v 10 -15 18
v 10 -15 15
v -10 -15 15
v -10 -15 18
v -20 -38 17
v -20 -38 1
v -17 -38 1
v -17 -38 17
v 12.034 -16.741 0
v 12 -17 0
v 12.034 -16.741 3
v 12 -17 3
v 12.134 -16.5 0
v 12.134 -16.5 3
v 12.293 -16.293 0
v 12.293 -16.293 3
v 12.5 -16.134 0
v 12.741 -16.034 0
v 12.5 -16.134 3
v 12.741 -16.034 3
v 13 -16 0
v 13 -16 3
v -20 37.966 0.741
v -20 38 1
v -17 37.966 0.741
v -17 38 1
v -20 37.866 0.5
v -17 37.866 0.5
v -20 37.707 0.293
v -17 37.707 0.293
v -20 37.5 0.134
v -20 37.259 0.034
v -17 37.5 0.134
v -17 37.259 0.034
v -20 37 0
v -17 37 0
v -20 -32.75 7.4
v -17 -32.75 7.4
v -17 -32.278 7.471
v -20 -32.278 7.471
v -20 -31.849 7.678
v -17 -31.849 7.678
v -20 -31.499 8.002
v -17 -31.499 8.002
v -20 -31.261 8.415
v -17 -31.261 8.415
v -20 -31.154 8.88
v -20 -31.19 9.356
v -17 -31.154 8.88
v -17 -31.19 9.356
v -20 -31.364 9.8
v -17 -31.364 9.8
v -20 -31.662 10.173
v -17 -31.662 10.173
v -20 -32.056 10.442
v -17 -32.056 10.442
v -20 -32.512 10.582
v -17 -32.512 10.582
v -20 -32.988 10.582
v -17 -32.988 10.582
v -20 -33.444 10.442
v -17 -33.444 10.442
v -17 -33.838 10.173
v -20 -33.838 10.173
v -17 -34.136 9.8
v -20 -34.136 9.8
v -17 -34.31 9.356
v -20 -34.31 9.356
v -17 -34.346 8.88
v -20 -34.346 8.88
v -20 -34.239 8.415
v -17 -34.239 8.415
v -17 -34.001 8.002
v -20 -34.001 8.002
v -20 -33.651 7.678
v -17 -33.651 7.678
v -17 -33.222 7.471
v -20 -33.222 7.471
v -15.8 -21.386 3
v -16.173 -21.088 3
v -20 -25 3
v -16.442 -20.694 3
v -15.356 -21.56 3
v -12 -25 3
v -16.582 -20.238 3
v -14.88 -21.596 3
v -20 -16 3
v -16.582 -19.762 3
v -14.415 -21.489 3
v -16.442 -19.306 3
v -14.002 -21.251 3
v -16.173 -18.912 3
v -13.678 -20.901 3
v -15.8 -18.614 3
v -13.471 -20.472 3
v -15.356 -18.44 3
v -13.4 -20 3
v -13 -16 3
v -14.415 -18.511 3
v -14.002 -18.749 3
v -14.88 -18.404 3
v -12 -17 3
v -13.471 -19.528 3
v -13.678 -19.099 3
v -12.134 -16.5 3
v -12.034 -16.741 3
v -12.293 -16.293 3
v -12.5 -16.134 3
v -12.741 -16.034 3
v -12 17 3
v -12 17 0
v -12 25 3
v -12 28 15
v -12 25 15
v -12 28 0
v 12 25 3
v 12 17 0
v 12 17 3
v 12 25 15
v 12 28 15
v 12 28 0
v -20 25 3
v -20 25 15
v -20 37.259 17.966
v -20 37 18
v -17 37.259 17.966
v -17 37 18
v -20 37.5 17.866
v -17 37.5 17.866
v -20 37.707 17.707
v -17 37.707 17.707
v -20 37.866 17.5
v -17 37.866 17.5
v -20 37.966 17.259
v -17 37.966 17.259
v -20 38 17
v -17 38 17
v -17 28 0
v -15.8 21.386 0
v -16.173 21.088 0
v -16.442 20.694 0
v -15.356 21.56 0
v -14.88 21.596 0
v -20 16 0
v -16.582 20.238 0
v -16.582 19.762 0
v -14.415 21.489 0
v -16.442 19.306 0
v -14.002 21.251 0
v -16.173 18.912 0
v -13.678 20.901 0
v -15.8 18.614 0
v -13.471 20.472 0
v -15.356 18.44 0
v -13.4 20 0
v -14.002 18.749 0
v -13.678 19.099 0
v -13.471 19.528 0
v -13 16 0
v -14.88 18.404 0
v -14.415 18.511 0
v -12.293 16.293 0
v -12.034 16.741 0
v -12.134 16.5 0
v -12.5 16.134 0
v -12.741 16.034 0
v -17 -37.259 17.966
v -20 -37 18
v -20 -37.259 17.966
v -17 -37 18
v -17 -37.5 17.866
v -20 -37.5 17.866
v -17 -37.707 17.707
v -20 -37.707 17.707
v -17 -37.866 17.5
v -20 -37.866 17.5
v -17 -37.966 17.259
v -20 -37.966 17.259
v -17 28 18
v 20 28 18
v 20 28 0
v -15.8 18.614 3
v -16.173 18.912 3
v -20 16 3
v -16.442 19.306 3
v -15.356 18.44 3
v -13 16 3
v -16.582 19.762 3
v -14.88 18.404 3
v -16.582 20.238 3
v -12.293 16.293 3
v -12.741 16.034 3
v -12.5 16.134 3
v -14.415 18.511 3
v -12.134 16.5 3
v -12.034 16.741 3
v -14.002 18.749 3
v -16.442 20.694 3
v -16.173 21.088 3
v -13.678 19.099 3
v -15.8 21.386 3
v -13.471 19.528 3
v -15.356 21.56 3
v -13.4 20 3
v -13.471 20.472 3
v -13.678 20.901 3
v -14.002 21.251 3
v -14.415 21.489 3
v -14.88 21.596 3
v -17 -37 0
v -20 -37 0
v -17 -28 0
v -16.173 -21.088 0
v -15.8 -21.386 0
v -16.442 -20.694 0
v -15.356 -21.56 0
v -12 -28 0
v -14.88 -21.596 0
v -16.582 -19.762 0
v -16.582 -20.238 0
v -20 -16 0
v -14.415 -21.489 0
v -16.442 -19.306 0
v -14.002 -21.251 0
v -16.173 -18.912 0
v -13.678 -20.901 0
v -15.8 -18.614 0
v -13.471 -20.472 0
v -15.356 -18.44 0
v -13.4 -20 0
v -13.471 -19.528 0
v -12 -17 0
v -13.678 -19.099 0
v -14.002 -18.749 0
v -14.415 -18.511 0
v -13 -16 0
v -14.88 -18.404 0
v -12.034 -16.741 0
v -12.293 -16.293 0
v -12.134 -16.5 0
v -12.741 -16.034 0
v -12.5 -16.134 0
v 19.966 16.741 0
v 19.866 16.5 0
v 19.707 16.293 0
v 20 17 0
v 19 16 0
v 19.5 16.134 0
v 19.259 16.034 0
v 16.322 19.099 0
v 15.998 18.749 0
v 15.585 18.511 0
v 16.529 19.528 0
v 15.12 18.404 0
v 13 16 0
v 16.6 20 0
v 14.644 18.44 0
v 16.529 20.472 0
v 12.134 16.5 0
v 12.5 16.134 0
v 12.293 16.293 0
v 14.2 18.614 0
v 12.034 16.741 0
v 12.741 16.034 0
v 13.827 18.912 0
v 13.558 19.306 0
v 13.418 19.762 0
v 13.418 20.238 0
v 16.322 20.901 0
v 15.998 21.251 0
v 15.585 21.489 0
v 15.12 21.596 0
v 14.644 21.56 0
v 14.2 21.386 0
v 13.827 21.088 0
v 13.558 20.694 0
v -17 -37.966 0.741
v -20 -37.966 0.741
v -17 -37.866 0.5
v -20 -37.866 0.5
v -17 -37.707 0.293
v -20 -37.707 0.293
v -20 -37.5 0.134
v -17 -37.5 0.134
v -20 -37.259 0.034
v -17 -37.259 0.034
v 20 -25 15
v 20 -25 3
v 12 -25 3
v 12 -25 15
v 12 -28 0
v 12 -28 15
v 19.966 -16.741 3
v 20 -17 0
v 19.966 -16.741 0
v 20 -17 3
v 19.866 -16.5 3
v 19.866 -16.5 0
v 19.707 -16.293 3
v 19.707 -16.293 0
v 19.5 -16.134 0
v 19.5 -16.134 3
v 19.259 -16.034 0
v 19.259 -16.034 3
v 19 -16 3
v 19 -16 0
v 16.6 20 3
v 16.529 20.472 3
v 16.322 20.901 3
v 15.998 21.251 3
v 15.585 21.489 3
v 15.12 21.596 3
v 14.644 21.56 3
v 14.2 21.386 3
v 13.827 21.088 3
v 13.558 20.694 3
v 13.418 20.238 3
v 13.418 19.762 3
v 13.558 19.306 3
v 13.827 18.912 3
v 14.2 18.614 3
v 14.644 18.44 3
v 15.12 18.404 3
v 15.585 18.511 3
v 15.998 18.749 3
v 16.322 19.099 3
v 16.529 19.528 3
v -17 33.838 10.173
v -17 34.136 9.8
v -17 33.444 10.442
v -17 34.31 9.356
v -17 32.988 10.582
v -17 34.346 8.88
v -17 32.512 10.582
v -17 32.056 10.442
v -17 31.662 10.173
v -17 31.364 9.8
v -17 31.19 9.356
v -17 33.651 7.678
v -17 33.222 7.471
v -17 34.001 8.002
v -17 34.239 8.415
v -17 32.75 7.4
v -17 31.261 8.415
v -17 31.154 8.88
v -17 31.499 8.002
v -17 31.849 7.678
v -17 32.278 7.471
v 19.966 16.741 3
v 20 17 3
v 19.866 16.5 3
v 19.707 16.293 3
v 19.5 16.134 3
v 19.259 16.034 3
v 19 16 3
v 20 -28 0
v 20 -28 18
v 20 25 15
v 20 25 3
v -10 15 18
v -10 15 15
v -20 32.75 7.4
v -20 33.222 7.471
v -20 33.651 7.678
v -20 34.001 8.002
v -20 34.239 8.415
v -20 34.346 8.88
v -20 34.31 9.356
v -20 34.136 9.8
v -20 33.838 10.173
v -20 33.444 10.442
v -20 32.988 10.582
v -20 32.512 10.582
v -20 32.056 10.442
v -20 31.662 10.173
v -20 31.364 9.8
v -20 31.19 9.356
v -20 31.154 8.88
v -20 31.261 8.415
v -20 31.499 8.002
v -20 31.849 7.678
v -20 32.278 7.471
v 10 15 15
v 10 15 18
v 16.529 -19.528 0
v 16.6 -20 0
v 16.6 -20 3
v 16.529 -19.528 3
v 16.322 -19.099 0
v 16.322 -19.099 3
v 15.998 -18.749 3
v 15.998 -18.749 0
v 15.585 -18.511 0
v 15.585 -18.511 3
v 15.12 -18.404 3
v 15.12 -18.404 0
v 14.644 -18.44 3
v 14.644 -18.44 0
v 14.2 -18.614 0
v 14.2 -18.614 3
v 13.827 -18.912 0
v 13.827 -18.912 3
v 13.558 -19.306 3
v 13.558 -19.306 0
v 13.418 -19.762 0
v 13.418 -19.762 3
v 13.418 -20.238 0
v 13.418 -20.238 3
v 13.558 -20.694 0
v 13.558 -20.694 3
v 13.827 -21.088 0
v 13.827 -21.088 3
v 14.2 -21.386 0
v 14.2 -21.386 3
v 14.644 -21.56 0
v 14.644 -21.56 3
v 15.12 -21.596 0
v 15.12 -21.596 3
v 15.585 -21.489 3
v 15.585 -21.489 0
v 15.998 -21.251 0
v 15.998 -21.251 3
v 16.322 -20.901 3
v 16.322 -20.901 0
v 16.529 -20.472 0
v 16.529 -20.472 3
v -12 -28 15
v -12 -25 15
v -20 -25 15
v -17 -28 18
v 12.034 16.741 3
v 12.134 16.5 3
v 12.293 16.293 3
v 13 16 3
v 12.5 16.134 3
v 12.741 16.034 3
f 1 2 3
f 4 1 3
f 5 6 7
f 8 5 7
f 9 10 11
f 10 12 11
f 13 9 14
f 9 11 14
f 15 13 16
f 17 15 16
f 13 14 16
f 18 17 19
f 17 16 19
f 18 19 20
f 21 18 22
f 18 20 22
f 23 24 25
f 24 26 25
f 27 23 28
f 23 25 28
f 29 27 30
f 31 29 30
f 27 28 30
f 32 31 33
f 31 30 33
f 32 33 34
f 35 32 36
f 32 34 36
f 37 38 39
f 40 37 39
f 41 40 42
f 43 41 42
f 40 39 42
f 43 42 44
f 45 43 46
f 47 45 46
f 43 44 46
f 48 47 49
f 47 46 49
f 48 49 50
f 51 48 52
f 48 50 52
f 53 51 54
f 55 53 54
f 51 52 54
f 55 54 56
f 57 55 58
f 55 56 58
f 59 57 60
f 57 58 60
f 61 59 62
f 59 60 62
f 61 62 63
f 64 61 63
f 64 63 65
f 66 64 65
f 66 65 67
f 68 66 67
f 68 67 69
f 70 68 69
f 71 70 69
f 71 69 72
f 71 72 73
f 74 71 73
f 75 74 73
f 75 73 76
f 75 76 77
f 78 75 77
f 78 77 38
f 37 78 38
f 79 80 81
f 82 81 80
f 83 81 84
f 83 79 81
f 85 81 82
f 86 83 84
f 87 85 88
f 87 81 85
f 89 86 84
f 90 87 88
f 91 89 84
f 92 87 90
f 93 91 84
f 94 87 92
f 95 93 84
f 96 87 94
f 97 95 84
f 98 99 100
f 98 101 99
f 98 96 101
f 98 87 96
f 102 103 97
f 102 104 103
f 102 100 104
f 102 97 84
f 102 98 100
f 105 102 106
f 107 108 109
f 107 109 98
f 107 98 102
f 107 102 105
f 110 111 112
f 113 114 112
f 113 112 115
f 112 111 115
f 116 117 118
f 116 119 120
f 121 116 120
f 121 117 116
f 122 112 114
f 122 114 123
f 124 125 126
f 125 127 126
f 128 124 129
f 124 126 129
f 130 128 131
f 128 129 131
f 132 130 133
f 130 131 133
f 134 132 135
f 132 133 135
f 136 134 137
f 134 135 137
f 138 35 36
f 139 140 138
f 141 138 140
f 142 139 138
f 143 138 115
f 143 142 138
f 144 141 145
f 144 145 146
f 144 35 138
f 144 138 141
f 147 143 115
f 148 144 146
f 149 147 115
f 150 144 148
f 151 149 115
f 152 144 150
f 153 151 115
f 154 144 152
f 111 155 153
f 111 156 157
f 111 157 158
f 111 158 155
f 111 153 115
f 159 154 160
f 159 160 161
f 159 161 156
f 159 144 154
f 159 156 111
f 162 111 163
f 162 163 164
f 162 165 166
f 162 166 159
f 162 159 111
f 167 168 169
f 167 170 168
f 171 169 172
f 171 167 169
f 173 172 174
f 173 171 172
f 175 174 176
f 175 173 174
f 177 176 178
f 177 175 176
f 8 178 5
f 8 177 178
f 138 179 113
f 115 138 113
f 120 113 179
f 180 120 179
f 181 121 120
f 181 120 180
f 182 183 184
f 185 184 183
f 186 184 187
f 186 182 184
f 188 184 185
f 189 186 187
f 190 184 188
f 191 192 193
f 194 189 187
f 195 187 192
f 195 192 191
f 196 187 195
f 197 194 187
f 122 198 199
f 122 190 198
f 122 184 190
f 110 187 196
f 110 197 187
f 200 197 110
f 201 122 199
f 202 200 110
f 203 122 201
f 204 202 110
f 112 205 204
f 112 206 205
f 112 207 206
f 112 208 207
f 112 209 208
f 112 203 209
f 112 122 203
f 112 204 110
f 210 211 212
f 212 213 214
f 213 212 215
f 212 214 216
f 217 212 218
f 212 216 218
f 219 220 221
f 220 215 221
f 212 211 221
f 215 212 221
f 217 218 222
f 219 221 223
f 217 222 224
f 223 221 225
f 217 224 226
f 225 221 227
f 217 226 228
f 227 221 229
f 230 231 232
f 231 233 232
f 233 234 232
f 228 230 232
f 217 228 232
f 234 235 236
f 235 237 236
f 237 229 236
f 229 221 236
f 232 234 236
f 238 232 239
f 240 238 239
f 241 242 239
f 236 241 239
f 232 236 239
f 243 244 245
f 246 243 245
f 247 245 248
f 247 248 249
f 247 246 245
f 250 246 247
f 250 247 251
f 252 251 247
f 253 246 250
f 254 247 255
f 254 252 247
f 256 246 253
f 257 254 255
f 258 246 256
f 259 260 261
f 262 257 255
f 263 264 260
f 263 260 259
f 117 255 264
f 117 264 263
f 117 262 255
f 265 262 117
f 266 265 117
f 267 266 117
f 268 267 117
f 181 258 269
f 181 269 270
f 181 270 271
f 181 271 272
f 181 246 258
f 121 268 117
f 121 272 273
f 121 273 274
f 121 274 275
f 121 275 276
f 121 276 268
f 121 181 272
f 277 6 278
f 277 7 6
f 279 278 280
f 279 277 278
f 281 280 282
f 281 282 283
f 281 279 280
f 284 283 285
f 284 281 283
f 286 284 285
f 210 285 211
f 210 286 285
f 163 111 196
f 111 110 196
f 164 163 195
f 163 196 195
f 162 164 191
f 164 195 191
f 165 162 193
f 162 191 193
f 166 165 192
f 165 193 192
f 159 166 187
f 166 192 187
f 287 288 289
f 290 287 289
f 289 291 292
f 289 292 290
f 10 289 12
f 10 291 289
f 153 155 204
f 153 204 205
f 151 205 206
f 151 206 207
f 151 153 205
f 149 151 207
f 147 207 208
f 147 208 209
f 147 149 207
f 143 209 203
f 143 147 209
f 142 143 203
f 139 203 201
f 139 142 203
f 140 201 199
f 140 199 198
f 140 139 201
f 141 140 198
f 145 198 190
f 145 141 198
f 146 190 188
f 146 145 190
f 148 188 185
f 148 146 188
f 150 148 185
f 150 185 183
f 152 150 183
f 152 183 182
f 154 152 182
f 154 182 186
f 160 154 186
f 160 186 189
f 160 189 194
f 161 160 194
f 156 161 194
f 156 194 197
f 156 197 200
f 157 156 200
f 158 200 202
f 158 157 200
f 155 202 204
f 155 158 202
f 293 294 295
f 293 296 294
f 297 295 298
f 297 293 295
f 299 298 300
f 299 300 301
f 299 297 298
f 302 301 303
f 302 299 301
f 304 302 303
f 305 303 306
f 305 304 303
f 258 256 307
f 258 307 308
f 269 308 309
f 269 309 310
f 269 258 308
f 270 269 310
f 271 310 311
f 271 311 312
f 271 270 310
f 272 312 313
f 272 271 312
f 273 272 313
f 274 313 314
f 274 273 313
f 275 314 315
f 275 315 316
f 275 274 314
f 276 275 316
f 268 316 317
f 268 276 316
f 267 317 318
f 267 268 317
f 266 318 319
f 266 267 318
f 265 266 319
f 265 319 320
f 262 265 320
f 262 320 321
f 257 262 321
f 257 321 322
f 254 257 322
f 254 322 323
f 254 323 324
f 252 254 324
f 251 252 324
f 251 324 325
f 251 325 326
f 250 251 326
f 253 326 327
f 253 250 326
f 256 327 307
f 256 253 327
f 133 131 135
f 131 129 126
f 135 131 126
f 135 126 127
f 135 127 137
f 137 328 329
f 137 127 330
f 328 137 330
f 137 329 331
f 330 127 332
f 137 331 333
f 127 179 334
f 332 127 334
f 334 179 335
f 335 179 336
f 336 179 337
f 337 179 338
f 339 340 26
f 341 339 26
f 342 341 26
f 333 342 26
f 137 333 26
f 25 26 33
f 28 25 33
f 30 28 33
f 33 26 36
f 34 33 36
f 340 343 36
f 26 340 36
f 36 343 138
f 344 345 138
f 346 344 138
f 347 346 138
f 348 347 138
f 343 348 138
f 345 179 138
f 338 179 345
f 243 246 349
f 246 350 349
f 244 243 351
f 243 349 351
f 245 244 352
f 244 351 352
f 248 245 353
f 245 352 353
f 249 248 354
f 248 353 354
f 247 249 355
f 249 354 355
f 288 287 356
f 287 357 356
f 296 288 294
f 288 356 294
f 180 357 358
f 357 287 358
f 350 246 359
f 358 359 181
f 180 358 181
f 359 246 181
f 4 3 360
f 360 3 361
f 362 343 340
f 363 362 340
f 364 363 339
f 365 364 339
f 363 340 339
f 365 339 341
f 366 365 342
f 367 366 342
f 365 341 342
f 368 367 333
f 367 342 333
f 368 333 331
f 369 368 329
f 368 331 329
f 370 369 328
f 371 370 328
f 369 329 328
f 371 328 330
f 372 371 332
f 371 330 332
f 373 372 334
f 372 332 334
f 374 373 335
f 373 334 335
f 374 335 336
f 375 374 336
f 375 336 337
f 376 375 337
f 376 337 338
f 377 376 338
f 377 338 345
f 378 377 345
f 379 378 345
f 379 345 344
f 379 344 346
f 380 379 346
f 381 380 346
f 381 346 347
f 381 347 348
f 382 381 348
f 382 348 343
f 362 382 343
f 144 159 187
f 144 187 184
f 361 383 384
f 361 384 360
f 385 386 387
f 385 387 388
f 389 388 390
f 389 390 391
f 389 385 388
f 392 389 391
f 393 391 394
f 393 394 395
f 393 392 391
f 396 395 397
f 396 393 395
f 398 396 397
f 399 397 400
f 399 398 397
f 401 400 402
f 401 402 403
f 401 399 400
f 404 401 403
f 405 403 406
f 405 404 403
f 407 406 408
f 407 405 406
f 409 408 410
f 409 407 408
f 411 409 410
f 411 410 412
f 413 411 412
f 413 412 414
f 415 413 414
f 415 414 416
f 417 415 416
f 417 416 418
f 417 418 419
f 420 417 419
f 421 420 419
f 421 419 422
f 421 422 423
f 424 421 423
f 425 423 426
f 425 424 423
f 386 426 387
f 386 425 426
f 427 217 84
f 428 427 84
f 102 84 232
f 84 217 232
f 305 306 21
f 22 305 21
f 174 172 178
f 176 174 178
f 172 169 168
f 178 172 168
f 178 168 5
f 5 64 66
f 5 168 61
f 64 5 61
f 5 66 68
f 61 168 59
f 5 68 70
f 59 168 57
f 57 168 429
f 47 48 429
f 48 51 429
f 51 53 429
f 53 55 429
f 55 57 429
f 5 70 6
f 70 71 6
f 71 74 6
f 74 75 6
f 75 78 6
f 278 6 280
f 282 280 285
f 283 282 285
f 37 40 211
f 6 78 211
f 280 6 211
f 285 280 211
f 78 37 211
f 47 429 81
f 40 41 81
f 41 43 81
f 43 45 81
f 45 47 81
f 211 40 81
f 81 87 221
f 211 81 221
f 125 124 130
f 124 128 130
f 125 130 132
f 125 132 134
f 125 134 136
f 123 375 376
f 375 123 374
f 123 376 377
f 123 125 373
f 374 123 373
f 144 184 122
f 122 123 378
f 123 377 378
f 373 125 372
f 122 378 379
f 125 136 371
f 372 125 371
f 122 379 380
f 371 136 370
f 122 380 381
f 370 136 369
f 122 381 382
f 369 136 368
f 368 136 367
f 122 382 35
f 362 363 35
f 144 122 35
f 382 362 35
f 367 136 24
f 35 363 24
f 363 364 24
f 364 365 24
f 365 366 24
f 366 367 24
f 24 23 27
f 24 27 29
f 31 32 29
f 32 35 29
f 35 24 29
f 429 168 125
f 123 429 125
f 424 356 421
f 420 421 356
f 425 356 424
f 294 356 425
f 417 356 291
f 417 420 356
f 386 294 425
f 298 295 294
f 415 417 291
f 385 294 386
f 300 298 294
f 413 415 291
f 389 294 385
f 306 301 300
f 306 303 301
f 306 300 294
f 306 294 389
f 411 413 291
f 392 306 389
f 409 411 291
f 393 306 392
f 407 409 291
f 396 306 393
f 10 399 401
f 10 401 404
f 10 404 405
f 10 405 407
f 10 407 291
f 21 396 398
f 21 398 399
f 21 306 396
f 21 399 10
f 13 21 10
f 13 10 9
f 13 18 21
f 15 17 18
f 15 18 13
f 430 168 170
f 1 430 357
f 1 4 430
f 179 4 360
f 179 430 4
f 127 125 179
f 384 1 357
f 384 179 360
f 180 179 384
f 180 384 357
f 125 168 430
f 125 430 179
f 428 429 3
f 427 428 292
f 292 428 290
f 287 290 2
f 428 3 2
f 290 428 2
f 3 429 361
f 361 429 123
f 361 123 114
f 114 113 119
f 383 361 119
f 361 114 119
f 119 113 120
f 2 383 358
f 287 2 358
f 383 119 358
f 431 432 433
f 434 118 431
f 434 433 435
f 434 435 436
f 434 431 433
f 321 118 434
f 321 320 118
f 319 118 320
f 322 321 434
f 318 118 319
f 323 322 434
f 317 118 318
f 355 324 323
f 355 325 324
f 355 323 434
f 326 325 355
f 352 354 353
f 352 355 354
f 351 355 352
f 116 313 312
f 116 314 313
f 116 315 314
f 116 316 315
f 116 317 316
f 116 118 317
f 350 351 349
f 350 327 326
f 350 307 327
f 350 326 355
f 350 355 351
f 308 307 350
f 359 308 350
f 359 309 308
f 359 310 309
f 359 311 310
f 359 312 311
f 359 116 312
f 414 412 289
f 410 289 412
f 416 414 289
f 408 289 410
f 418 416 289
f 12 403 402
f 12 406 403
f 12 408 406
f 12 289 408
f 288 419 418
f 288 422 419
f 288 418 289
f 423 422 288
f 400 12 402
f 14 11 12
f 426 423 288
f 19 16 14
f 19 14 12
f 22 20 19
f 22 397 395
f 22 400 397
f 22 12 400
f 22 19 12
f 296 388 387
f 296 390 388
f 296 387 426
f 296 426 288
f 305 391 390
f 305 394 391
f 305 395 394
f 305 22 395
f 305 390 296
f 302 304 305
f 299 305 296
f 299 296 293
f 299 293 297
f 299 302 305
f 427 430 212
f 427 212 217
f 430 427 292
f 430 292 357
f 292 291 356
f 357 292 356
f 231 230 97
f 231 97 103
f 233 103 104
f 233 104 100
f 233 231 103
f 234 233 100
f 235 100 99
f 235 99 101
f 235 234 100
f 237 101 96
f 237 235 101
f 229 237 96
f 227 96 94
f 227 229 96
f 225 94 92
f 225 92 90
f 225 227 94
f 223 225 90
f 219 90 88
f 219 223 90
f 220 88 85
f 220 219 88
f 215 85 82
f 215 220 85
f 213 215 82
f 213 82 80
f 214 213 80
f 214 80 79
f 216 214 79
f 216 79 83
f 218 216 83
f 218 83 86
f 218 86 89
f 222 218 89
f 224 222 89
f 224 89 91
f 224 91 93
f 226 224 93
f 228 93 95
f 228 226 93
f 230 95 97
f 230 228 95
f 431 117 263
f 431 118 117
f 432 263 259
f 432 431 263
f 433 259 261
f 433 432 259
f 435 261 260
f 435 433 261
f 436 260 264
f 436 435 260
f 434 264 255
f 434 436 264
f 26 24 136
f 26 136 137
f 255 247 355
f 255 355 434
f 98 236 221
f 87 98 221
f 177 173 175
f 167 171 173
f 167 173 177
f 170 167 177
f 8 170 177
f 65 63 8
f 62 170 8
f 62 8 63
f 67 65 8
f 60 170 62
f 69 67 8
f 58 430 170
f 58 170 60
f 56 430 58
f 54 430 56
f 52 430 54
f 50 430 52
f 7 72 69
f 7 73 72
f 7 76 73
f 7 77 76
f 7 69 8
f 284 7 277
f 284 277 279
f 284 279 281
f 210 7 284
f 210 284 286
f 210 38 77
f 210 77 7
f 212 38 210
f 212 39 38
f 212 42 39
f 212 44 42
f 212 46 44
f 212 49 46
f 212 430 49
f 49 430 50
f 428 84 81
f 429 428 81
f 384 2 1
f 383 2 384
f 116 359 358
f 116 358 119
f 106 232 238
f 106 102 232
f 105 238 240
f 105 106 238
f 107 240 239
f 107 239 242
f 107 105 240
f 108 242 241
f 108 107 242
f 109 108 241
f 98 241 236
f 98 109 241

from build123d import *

# Parameters (mm, degrees)
SKETCH_1_W          = 40
SKETCH_1_H          = 50
SKETCH_1_R          = 1.6
EXTRUDE_1_DEPTH     = 3
SKETCH_2_W          = 8
SKETCH_2_H          = 3
EXTRUDE_2_DEPTH     = 15
SKETCH_3_W          = 40
SKETCH_3_H          = 56
EXTRUDE_3_DEPTH     = 3
CUT_EXTRUDE_1_REACH = 40.833
SKETCH_4_W          = 40
SKETCH_4_H          = 32
CUT_EXTRUDE_START   = -3
SKETCH_5_W          = 24
SKETCH_5_H          = 50
CUT_EXTRUDE_2_DEPTH = 3
FILLET_1_R          = 1
CUT_EXTRUDE_4_REACH = 39.537
SKETCH_10_W         = 20
SKETCH_10_H         = 30
SKETCH_11_W         = 3
SKETCH_11_H         = 18
EXTRUDE_4_DEPTH     = 10
CUT_EXTRUDE_5_REACH = 58.009
SKETCH_12_R         = 1.6
FILLET_2_R          = 1


with BuildPart() as part:
    # 草图1 → 凸台-拉伸1 (new body)
    with BuildSketch(Plane.XY):
        Rectangle(SKETCH_1_W, SKETCH_1_H)
        with Locations((-15, 20)):
            Circle(SKETCH_1_R, mode=Mode.SUBTRACT)
        with Locations((15, 20)):
            Circle(SKETCH_1_R, mode=Mode.SUBTRACT)
        with Locations((15, -20)):
            Circle(SKETCH_1_R, mode=Mode.SUBTRACT)
        with Locations((-15, -20)):
            Circle(SKETCH_1_R, mode=Mode.SUBTRACT)
    extrude(amount=EXTRUDE_1_DEPTH)

    # 草图2 → 凸台-拉伸2 (add)
    with BuildSketch(Plane(origin=(0, 0, 0), x_dir=(-1, 0, 0), z_dir=(0, 0, -1))):
        with Locations((-16, 26.5)):
            Rectangle(SKETCH_2_W, SKETCH_2_H)
        with Locations((16, 26.5)):
            Rectangle(SKETCH_2_W, SKETCH_2_H)
        with Locations((-16, -26.5)):
            Rectangle(SKETCH_2_W, SKETCH_2_H)
        with Locations((16, -26.5)):
            Rectangle(SKETCH_2_W, SKETCH_2_H)
    extrude(amount=-EXTRUDE_2_DEPTH)

    # 草图3 → 凸台-拉伸3 (add)
    with BuildSketch(Plane.XY.offset(15)):
        Rectangle(SKETCH_3_W, SKETCH_3_H)
    extrude(amount=EXTRUDE_3_DEPTH)

    # 草图4 → 切除-拉伸1 (cut, up to next)
    with BuildSketch(Plane(origin=(0, 0, 0), x_dir=(-1, 0, 0), z_dir=(0, 0, -1)), mode=Mode.PRIVATE) as cut_extrude_1_sk1:
        Rectangle(SKETCH_4_W, SKETCH_4_H)
    cut_extrude_1_tool1 = extrude(cut_extrude_1_sk1.sketch, amount=-CUT_EXTRUDE_1_REACH, mode=Mode.PRIVATE) & part.part
    add(cut_extrude_1_tool1.solids().sort_by_distance((0, 0, 0))[0], mode=Mode.SUBTRACT)

    # 草图5 → 切除-拉伸2 (cut)
    with BuildSketch(Plane(origin=(0, 0, 0), x_dir=(-1, 0, 0), z_dir=(0, 0, -1)).offset(CUT_EXTRUDE_START)):
        Rectangle(SKETCH_5_W, SKETCH_5_H)
    extrude(amount=CUT_EXTRUDE_2_DEPTH, mode=Mode.SUBTRACT)

    # 圆角1
    fillet_1_edges = [part.edges().sort_by_distance(p)[0] for p in [
        (20, -16, 1.5),
        (20, 16, 1.5),
        (12, 16, 1.5),
        (-12, 16, 1.5),
        (12, -16, 1.5),
        (-12, -16, 1.5),
    ]]
    fillet(fillet_1_edges, radius=FILLET_1_R)

    # 草图10 → 切除-拉伸4 (cut, up to next)
    with BuildSketch(Plane(origin=(0, 0, 15), x_dir=(-1, 0, 0), z_dir=(0, 0, -1)), mode=Mode.PRIVATE) as cut_extrude_4_sk1:
        Rectangle(SKETCH_10_W, SKETCH_10_H)
    cut_extrude_4_tool1 = extrude(cut_extrude_4_sk1.sketch, amount=-CUT_EXTRUDE_4_REACH, mode=Mode.PRIVATE) & part.part
    add(cut_extrude_4_tool1.solids().sort_by_distance((0, 0, 15))[0], mode=Mode.SUBTRACT)

    # 草图11 → 凸台-拉伸4 (add)
    with BuildSketch(Plane(origin=(0, 28, 0), x_dir=(1, 0, 0), z_dir=(0, 1, 0))):
        with Locations((-18.5, -9)):
            Rectangle(SKETCH_11_W, SKETCH_11_H)
    extrude_4 = extrude(amount=EXTRUDE_4_DEPTH)

    # 镜向1: 凸台-拉伸4 across plane
    add(extrude_4.mirror(Plane.ZX))

    # 草图12 → 切除-拉伸5 (cut, up to next)
    with BuildSketch(Plane(origin=(-17, 0, 0), x_dir=(0, 0, -1), z_dir=(1, 0, 0)), mode=Mode.PRIVATE) as cut_extrude_5_sk1:
        with Locations((-9, 32.75)):
            Circle(SKETCH_12_R)
    cut_extrude_5_tool1 = extrude(cut_extrude_5_sk1.sketch, amount=-CUT_EXTRUDE_5_REACH, mode=Mode.PRIVATE) & part.part
    # 草图12 → 切除-拉伸5 (cut, up to next)
    with BuildSketch(Plane(origin=(-17, 0, 0), x_dir=(0, 0, -1), z_dir=(1, 0, 0)), mode=Mode.PRIVATE) as cut_extrude_5_sk2:
        with Locations((-9, -32.75)):
            Circle(SKETCH_12_R)
    cut_extrude_5_tool2 = extrude(cut_extrude_5_sk2.sketch, amount=-CUT_EXTRUDE_5_REACH, mode=Mode.PRIVATE) & part.part
    add(cut_extrude_5_tool1.solids().sort_by_distance((-17, 32.75, 9))[0], mode=Mode.SUBTRACT)
    add(cut_extrude_5_tool2.solids().sort_by_distance((-17, -32.75, 9))[0], mode=Mode.SUBTRACT)

    # 圆角2
    fillet_2_edges = [part.edges().sort_by_distance(p)[0] for p in [
        (-18.5, 38, 18),
        (-18.5, 38, 0),
        (-18.5, -38, 0),
        (-18.5, -38, 18),
    ]]
    fillet(fillet_2_edges, radius=FILLET_2_R)


solid = part.part
